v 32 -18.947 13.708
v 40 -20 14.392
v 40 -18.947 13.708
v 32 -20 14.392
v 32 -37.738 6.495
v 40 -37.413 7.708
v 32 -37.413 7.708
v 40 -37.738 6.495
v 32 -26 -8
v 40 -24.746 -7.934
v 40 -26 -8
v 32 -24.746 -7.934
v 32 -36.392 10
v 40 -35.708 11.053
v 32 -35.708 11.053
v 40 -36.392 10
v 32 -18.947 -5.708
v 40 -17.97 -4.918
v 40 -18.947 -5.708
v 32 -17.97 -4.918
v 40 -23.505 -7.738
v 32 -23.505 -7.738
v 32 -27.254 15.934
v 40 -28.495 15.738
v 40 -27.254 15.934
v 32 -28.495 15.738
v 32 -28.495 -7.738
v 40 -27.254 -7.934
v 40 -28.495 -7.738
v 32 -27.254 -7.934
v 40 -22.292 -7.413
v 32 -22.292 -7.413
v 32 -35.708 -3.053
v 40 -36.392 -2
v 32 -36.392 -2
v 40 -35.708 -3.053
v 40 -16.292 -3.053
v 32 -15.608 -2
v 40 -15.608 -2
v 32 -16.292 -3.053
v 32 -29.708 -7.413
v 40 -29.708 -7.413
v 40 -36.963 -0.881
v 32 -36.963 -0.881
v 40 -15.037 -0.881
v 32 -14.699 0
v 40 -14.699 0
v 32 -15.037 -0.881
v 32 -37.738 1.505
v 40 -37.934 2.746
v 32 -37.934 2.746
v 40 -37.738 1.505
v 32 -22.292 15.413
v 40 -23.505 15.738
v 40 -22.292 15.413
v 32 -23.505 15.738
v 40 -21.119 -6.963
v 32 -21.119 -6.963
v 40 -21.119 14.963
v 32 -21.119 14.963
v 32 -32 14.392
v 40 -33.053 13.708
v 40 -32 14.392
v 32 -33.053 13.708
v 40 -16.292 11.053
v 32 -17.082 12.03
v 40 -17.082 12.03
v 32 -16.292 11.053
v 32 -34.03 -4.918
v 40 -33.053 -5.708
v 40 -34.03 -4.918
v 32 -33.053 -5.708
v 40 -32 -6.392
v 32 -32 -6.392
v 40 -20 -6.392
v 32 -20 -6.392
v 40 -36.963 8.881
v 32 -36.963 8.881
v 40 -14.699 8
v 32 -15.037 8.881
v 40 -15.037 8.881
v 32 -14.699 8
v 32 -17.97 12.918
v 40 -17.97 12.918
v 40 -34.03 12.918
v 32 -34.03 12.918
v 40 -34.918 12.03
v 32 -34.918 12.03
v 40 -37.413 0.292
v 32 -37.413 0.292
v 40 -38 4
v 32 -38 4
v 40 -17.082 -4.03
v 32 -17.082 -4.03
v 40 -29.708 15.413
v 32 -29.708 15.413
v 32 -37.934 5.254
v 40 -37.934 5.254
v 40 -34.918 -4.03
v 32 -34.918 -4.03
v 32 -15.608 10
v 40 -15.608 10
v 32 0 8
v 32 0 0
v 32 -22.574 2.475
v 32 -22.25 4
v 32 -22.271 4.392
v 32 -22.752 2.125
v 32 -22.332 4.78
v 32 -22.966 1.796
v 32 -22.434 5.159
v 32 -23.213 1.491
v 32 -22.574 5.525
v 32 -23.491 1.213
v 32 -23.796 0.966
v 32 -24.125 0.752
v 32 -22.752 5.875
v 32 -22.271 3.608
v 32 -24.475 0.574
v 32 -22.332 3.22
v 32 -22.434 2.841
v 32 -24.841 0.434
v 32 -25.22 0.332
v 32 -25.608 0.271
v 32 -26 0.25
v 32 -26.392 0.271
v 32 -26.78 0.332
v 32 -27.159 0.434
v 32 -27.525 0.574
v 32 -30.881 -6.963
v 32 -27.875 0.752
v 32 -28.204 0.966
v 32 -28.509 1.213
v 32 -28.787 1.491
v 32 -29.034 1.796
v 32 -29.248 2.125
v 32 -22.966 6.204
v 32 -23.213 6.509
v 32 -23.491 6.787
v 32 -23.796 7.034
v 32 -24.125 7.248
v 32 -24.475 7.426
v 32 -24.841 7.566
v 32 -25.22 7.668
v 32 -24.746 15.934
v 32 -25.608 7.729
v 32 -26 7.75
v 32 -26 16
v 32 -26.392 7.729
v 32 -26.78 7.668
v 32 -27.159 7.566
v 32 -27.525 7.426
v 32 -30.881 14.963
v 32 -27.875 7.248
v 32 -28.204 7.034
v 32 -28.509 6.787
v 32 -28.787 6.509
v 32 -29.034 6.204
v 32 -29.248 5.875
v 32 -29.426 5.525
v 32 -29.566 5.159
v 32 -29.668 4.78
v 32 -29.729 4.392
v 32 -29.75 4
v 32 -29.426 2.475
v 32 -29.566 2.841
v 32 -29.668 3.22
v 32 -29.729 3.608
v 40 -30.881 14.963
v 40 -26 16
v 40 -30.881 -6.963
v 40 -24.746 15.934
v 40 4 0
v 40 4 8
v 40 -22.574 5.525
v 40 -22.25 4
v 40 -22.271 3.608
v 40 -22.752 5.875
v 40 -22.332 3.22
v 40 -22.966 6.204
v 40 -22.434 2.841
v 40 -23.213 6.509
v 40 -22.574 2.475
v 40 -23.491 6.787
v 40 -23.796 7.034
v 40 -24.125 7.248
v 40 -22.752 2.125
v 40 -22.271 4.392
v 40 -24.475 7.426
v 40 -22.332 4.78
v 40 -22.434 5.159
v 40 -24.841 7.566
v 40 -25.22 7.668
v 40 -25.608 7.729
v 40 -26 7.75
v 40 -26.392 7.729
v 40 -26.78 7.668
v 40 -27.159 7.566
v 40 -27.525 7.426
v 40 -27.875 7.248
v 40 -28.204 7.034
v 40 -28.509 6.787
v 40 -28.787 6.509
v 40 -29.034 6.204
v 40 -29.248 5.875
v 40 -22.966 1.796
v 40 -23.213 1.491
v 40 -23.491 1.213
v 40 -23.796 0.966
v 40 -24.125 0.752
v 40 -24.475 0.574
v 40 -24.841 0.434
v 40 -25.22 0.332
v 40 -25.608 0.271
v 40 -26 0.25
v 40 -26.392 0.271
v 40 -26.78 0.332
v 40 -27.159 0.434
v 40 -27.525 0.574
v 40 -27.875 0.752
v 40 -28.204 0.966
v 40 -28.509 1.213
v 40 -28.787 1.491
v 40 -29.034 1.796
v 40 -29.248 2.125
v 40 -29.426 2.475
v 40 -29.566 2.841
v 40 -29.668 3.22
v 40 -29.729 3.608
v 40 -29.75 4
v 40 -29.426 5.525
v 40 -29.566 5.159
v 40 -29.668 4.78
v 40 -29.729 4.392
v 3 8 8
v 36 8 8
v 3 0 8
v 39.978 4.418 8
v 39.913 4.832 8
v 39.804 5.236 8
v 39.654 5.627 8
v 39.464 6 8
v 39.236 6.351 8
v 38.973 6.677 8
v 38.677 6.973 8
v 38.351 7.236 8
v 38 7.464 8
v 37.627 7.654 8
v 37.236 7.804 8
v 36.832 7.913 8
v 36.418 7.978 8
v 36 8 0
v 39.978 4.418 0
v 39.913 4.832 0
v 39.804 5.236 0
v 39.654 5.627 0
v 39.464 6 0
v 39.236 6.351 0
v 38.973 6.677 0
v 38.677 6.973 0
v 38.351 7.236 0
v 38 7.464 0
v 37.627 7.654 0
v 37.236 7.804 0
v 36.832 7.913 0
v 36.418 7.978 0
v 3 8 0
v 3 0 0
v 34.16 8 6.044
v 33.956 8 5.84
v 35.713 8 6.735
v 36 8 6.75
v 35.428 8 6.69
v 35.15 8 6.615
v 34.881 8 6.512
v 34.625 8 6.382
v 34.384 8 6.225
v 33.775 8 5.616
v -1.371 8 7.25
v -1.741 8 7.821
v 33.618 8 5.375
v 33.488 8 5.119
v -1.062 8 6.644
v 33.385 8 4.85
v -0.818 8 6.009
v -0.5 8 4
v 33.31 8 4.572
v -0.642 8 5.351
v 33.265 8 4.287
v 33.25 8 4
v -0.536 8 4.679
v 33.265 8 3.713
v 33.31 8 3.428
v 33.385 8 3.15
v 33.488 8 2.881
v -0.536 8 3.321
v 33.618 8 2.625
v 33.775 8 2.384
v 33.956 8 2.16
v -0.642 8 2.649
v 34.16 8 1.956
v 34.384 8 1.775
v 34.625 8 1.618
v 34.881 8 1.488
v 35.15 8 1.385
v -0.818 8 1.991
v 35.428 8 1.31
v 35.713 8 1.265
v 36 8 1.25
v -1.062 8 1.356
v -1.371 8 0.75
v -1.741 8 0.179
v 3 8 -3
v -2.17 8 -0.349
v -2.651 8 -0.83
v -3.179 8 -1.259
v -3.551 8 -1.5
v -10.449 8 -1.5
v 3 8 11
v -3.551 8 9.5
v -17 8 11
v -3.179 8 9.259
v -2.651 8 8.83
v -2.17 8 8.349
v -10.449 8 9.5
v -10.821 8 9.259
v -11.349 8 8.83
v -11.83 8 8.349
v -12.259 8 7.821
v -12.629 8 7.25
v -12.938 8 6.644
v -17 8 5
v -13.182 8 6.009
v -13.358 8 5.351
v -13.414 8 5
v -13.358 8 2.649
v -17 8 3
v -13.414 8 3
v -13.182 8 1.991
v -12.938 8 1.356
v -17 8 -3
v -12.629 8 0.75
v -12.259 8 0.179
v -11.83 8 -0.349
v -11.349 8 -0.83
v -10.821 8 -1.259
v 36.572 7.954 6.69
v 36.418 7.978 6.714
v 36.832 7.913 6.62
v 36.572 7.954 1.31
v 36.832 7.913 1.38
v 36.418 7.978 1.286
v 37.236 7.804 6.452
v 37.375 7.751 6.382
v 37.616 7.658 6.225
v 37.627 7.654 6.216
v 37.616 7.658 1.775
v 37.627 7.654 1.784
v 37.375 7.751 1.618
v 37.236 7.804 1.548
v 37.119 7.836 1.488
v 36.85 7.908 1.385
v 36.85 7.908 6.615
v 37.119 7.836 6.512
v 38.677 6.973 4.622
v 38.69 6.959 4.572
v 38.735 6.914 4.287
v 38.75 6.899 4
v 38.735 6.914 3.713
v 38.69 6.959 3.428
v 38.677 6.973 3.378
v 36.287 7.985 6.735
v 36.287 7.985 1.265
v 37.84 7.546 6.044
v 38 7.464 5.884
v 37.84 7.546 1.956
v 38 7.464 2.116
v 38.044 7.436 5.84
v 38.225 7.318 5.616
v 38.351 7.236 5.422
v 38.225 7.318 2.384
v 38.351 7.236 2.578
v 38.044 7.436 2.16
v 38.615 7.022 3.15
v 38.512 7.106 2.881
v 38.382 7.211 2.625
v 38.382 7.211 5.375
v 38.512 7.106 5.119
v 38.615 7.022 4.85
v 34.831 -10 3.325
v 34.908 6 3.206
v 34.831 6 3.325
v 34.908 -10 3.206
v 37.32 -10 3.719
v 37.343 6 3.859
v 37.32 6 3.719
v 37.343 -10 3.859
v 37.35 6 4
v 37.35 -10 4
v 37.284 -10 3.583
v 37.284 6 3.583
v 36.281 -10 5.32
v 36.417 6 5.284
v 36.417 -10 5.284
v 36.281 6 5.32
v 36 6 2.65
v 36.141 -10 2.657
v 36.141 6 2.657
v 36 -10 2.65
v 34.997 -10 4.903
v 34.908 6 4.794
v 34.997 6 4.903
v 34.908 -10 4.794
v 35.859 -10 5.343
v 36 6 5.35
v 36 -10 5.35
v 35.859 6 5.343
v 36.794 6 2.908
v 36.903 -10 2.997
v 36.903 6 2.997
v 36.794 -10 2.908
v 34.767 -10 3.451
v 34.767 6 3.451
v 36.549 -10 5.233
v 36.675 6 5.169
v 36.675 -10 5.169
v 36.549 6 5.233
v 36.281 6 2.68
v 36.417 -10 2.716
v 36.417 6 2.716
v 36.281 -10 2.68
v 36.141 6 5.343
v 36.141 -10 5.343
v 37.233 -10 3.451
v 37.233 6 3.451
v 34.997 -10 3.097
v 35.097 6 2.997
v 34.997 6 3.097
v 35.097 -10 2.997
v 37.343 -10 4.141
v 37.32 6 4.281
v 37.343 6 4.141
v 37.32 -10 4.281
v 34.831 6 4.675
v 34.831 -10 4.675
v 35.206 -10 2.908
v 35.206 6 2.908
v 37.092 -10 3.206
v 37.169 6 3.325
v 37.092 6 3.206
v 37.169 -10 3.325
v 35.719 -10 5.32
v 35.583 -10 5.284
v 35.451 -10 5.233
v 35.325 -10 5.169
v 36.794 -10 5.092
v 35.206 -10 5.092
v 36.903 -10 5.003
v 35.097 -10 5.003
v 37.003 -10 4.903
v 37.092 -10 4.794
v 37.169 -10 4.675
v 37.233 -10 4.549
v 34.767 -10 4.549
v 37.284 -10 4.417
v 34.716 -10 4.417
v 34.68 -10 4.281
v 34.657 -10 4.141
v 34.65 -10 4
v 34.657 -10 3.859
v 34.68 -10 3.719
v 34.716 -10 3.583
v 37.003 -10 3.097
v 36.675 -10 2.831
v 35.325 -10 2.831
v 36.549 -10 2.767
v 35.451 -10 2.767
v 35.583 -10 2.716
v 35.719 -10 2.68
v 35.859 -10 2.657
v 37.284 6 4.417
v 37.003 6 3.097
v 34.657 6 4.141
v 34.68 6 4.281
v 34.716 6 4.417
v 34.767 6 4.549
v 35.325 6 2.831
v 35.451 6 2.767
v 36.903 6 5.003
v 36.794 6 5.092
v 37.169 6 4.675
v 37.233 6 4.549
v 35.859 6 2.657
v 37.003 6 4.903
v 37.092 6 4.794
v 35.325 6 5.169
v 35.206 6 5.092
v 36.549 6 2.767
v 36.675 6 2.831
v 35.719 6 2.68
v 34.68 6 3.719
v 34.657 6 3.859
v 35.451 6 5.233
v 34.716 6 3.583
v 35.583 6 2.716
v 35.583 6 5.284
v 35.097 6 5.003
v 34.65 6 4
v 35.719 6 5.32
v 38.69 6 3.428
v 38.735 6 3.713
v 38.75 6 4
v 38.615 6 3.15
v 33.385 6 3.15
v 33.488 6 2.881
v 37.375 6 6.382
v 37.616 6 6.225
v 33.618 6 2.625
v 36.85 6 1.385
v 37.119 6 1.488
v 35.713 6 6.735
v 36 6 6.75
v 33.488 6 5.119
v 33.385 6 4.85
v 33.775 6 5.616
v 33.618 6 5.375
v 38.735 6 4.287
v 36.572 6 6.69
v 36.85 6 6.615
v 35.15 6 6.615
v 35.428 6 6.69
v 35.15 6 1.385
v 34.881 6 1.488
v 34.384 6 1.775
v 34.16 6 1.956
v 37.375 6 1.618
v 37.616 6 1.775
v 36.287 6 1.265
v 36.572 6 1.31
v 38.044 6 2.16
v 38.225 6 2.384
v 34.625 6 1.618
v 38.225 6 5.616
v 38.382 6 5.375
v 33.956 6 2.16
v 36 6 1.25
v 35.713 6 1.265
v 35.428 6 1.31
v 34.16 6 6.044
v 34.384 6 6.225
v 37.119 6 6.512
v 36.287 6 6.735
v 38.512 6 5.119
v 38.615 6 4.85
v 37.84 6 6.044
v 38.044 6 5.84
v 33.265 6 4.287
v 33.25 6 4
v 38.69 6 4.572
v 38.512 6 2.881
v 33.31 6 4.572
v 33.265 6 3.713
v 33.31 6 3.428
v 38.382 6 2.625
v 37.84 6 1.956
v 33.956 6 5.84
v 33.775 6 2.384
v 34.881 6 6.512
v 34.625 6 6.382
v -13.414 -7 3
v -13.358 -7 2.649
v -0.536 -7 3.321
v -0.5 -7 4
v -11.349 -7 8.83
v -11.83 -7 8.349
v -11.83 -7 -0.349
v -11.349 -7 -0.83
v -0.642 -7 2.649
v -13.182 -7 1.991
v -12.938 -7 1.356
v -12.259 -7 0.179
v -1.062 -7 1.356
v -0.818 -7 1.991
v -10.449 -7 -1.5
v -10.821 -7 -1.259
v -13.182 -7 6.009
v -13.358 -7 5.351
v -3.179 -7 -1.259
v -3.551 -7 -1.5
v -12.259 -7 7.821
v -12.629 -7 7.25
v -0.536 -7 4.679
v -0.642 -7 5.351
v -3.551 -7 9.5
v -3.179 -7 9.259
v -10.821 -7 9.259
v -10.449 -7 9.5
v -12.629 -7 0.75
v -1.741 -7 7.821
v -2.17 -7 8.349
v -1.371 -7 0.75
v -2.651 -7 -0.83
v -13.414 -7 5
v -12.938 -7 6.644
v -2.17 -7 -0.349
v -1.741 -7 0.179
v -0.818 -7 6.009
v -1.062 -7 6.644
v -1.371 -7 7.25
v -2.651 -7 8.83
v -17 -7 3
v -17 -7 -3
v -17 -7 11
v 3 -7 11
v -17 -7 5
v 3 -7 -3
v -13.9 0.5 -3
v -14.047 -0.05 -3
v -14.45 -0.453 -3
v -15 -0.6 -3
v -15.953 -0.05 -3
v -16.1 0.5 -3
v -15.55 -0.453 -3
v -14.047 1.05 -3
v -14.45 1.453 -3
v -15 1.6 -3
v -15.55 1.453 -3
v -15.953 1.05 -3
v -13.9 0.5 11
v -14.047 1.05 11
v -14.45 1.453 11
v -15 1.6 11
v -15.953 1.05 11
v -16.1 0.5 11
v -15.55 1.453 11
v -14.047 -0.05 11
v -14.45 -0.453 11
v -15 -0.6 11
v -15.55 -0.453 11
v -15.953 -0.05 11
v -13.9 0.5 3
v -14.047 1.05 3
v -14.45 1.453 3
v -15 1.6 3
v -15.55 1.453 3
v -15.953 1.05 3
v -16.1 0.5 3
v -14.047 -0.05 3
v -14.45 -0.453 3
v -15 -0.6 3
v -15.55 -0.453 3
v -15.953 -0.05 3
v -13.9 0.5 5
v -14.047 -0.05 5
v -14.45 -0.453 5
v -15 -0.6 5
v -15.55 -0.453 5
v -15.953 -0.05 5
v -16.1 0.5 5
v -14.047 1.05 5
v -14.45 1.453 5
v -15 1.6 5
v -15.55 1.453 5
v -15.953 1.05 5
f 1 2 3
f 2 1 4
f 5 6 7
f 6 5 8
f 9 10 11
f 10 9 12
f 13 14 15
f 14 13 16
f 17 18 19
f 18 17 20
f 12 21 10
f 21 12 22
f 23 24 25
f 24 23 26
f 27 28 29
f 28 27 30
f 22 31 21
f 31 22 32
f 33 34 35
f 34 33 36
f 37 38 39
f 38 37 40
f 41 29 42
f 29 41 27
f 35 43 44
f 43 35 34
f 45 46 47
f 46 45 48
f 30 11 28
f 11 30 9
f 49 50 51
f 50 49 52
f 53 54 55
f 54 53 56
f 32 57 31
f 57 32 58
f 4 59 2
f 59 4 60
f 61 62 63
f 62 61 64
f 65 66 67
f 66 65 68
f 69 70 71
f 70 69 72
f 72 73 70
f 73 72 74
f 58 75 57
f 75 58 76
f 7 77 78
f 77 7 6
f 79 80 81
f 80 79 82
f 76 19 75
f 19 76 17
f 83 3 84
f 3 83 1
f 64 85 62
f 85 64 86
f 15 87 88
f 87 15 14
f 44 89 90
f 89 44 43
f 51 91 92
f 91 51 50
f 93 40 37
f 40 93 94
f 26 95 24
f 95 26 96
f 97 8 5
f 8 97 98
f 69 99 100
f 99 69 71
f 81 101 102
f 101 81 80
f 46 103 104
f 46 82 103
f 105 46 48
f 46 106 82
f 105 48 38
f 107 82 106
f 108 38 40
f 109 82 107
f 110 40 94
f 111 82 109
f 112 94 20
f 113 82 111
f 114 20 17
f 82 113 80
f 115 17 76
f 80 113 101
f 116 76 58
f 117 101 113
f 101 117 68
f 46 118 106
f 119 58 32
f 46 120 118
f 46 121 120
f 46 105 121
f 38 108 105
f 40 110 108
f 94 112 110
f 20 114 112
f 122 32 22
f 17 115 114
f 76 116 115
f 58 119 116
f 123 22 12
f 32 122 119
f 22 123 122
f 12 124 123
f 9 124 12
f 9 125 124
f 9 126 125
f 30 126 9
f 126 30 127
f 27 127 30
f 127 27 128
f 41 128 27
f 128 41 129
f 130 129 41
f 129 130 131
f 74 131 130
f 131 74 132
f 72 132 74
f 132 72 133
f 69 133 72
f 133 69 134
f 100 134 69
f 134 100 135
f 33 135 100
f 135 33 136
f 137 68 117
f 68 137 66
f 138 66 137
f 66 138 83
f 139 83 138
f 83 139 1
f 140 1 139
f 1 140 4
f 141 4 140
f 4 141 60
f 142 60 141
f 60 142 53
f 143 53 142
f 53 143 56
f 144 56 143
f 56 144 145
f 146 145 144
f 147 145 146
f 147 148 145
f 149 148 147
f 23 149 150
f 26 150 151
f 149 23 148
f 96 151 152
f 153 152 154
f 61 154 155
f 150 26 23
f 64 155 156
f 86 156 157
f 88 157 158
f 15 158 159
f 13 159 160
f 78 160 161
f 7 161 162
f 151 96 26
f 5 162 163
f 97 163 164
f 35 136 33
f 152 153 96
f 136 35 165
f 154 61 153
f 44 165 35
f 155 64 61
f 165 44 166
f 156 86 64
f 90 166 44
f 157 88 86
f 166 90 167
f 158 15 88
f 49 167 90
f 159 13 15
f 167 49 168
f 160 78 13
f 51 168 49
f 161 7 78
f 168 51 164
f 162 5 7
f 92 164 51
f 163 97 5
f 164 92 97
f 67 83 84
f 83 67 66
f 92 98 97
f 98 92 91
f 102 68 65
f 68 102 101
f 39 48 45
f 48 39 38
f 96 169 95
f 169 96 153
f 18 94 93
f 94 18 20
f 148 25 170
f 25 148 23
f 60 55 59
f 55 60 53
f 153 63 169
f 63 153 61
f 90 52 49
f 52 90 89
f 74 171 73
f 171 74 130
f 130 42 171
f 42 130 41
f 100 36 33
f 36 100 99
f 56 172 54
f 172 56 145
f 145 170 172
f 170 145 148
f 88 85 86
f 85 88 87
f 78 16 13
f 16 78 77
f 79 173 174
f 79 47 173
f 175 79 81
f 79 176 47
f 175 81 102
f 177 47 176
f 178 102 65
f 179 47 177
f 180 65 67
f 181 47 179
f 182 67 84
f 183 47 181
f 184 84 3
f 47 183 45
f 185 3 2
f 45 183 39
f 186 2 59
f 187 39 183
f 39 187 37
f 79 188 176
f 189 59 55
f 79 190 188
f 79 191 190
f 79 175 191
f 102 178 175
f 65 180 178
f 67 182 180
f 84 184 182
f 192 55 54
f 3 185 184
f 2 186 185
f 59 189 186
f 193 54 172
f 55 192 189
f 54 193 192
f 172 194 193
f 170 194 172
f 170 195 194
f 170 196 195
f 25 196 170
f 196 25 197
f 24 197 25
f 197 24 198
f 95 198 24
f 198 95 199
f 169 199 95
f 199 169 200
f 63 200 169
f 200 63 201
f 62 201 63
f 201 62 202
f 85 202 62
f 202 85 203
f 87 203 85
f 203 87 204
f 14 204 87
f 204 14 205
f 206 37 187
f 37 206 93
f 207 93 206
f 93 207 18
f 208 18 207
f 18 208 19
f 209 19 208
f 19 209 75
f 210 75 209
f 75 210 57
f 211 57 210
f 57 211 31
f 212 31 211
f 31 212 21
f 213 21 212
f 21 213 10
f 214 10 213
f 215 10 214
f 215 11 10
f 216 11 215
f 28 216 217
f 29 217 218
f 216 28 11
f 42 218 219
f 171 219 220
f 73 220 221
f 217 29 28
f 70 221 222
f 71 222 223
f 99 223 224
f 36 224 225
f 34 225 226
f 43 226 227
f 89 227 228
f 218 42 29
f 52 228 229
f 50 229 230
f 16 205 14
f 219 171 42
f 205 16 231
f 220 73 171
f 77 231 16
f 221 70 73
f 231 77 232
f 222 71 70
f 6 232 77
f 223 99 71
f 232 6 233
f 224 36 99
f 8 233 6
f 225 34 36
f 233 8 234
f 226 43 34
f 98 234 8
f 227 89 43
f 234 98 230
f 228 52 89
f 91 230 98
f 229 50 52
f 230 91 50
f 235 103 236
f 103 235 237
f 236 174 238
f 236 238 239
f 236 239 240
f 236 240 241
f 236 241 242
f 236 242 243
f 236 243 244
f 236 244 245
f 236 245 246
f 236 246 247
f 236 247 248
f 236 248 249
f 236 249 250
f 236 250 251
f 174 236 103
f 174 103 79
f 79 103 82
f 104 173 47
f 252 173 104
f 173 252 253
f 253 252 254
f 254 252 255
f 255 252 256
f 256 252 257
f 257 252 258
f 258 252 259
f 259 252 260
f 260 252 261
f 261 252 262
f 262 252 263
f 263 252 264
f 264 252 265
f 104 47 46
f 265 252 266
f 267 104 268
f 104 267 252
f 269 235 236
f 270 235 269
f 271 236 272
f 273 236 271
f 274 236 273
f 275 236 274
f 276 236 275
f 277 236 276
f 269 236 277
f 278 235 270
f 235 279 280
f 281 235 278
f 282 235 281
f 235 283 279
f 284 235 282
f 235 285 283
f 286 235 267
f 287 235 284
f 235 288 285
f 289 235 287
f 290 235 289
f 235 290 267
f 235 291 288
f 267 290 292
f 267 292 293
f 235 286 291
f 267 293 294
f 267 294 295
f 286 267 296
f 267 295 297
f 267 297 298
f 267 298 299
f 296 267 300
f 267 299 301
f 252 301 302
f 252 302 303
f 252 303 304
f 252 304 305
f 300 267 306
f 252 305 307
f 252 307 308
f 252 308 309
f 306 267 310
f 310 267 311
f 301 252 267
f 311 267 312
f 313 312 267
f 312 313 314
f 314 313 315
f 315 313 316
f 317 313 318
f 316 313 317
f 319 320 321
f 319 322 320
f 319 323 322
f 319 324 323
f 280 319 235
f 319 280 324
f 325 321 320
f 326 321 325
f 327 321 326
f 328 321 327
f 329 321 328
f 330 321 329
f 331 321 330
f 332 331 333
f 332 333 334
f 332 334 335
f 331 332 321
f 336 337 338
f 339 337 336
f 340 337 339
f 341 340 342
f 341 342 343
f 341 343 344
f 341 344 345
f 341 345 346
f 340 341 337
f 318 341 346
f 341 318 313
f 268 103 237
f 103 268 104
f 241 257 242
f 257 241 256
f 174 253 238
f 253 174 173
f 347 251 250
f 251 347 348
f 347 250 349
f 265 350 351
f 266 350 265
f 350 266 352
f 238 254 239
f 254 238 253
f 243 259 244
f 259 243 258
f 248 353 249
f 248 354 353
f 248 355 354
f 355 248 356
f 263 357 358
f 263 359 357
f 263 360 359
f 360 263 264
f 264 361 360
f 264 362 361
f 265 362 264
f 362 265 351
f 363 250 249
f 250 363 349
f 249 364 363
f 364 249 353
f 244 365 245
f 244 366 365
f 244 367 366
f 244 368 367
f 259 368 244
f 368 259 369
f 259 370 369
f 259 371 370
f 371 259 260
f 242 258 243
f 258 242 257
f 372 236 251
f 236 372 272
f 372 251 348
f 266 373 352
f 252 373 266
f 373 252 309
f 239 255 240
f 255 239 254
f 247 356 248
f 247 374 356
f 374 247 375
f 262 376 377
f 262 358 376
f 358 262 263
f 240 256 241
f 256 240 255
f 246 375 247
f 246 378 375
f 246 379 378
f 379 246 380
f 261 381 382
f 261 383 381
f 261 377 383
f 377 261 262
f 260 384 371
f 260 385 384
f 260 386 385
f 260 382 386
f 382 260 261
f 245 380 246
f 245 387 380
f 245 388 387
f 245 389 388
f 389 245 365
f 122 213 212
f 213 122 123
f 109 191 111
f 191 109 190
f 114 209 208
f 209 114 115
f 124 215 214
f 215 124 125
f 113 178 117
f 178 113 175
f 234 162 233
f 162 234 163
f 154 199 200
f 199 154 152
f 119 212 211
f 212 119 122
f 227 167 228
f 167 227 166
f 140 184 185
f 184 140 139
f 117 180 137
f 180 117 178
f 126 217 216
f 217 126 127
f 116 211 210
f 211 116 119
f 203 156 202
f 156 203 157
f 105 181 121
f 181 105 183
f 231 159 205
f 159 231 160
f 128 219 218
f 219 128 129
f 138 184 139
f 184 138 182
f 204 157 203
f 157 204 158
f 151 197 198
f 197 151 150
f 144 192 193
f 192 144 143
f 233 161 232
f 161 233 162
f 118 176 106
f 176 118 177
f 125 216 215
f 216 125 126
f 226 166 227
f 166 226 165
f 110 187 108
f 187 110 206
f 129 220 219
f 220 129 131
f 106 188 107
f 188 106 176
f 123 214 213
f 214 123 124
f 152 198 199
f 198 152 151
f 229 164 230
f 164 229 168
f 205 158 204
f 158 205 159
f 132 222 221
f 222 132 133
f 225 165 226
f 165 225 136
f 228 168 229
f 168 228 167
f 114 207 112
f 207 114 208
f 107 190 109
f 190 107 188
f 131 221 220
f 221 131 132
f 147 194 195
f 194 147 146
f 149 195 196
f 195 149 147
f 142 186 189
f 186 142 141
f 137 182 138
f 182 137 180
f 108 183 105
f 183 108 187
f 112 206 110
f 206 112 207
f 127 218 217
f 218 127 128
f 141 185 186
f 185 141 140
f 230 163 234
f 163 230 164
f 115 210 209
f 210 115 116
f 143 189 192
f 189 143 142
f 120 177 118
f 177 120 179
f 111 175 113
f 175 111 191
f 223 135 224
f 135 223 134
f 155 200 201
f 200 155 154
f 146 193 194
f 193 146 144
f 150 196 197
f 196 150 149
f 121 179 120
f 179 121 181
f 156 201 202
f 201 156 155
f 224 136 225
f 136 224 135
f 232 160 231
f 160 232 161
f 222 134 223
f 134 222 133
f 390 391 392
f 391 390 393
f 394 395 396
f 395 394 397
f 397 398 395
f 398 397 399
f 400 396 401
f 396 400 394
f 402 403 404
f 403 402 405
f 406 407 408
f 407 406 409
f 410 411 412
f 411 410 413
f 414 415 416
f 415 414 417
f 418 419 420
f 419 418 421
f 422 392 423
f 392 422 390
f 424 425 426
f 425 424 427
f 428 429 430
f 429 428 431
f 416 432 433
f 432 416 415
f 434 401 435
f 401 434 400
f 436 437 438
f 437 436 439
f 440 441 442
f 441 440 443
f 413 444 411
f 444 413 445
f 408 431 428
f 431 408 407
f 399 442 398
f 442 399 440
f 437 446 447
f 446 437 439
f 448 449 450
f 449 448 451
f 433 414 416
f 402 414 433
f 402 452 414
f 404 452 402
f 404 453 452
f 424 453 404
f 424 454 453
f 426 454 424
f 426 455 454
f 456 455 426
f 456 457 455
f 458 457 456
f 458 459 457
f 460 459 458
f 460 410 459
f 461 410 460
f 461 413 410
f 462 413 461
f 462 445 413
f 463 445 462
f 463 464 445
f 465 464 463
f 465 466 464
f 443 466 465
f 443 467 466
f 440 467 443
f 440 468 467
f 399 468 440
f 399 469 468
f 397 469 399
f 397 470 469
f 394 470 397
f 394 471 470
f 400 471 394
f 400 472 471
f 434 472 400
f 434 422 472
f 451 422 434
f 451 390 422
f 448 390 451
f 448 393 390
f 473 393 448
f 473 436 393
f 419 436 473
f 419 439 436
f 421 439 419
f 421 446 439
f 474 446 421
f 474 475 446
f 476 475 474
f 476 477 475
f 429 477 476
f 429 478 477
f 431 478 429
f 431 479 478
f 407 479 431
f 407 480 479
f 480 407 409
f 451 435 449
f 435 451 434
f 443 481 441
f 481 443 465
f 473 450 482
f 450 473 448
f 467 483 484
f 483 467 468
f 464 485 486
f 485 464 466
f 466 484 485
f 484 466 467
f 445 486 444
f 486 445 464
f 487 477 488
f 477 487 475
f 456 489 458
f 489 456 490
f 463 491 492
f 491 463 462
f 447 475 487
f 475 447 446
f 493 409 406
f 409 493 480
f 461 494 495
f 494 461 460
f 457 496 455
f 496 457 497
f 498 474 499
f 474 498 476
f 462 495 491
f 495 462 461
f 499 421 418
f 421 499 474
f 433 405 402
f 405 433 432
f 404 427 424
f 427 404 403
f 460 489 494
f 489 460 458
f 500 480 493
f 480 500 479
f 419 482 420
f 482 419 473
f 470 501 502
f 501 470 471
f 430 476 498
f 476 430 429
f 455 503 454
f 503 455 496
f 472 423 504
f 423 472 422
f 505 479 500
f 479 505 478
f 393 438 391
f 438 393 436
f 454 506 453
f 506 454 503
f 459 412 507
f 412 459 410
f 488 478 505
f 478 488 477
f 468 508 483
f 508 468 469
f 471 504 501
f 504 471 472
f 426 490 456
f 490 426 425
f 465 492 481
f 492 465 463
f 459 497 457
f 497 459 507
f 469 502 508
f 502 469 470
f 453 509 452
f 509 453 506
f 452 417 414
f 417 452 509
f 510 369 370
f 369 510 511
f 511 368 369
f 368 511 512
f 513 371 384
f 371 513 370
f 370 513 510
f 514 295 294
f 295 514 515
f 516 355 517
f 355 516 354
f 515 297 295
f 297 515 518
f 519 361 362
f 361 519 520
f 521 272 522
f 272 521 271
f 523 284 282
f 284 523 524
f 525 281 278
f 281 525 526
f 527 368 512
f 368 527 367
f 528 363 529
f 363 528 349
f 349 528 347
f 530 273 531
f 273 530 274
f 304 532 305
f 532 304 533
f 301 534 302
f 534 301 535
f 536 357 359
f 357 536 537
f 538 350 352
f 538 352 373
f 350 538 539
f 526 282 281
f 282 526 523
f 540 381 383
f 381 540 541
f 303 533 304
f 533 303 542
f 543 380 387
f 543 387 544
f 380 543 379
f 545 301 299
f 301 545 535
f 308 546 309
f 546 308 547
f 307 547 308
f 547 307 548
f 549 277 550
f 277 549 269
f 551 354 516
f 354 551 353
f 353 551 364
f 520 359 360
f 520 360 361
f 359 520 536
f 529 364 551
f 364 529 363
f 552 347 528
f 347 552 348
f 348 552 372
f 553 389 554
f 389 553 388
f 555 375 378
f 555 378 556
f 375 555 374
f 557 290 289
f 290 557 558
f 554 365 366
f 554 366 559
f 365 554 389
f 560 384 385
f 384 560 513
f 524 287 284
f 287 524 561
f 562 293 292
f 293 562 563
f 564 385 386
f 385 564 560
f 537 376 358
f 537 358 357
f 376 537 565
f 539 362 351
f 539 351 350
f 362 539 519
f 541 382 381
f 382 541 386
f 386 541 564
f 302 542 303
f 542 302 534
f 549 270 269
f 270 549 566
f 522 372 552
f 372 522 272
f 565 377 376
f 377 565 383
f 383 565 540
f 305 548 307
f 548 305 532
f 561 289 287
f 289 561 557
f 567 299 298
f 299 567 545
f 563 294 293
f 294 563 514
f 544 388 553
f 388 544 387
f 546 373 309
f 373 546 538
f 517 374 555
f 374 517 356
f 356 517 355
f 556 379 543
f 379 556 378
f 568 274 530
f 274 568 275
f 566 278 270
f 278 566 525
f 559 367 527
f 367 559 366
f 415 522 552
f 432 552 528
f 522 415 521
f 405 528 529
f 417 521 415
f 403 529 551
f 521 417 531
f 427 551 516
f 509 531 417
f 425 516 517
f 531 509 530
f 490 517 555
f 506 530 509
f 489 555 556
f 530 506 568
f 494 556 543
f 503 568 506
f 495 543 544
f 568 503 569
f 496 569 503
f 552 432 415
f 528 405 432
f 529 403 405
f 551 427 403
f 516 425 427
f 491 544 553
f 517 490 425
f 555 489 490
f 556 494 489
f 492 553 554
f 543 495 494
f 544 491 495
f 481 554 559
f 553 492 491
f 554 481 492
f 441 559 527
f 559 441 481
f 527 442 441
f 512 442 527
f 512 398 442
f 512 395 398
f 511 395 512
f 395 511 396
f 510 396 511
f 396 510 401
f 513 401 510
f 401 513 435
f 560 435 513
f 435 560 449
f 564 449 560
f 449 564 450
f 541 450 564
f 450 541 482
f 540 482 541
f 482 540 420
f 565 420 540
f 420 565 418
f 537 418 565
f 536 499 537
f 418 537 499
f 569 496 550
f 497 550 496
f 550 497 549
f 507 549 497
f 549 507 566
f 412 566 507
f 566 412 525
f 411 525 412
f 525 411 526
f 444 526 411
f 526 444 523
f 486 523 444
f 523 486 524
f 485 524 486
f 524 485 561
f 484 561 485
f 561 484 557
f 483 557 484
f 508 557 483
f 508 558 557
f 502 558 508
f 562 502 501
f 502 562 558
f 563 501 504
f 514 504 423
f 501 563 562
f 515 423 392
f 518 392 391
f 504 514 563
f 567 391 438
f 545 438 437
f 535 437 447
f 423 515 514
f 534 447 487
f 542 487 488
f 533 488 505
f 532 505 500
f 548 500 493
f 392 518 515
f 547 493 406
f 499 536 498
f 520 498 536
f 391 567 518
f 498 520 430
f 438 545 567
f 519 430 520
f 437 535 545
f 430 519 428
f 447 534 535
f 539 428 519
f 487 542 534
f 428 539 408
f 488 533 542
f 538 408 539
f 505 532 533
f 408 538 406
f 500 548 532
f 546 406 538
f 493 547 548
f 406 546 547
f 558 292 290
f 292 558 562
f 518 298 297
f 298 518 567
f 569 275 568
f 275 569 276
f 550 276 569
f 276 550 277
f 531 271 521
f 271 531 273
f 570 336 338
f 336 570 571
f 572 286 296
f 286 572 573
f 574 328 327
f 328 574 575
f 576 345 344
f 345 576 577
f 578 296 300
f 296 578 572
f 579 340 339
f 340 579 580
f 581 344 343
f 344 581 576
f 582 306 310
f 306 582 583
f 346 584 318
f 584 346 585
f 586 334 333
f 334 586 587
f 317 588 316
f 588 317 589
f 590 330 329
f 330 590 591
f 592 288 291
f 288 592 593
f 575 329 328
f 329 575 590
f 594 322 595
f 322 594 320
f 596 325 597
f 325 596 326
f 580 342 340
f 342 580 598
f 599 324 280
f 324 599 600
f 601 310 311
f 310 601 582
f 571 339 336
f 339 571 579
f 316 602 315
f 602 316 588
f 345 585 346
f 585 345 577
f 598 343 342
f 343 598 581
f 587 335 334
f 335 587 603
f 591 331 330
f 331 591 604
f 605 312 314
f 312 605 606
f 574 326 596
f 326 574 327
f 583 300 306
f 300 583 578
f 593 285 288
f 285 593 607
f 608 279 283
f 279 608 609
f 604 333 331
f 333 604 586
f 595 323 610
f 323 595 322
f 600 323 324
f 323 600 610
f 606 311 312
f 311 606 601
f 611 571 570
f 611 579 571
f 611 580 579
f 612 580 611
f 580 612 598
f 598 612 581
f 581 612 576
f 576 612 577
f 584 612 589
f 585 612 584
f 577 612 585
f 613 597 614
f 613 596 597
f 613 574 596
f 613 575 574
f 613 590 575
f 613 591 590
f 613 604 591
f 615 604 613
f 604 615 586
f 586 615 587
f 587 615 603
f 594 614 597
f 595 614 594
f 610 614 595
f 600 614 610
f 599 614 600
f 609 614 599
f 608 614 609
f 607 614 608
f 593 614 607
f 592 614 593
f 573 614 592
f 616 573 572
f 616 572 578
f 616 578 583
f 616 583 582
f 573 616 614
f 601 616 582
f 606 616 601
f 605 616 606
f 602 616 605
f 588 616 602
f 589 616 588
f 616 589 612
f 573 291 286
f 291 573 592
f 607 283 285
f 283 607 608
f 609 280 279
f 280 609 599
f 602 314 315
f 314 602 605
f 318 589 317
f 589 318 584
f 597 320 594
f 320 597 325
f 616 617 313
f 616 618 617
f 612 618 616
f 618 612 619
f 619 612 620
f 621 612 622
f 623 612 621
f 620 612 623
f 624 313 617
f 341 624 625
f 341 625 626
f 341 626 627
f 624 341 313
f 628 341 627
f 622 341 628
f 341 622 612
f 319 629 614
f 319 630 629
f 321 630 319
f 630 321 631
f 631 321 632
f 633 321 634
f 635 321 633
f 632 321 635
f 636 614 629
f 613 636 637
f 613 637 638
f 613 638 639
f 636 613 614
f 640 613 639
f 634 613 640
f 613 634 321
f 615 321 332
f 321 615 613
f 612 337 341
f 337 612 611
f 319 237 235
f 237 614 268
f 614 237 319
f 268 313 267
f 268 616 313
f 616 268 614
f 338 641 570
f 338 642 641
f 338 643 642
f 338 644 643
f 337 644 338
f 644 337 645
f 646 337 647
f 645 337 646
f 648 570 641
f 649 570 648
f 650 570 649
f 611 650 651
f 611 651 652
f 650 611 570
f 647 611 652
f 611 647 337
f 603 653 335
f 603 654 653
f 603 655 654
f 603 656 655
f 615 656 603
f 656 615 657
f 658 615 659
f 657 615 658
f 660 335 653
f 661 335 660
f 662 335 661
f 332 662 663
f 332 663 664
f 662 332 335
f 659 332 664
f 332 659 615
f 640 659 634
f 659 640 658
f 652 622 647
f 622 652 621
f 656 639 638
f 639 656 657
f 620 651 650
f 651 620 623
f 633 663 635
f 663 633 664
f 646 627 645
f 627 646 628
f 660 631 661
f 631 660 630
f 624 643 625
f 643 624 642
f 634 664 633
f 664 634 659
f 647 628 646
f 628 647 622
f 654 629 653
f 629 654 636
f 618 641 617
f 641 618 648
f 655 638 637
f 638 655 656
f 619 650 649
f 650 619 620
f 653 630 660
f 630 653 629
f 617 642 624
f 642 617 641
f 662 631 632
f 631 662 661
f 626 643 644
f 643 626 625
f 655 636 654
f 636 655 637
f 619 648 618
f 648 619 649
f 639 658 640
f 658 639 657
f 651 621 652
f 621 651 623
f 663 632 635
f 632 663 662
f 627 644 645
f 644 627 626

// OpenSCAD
bracket();
translate([-7,-7,4])rotate([0,90,90])clamp();

//rotate([-90,0,0]) bracket();

module bracket(){
$fn=60;
difference(){
union(){
translate([32,-26,4])rotate([0,90,0])
cylinder(d=24,h=8);
translate([32,-16,0])cube([8,20,8]);
translate([0,0,0])cube([36,8,8]);    
translate([36,4,0])rotate([0,0,-90])
cylinder(d=8,h=8);    
}

translate([30,-26,4])rotate([0,90,0])
cylinder(d=7.5,h=10);
translate([36,-10,4])rotate([-90,0,0])
cylinder(d=2.7,h=25);
translate([36,6,4])rotate([-90,0,0])
cylinder(d=5.5,h=10);

}
}

module clamp(){
difference(){
translate([-7,-10,0])
cube([14,20,15]);
difference(){
    cylinder(d=13,h=25,$fn=60);
    translate([6.5,0,12])cube([2,12,25],center=true);
    translate([-6.5,0,12])cube([2,12,25],center=true);
}
translate([-1,0,0])cube([2,22,25]);
//translate([-9,-8,14.5])rotate([0,90,0])
//cylinder(d=2.2,h=21,$fn=12);
translate([-9,8,7.5])rotate([0,90,0])
cylinder(d=2.2,h=21,$fn=12);

}
}
